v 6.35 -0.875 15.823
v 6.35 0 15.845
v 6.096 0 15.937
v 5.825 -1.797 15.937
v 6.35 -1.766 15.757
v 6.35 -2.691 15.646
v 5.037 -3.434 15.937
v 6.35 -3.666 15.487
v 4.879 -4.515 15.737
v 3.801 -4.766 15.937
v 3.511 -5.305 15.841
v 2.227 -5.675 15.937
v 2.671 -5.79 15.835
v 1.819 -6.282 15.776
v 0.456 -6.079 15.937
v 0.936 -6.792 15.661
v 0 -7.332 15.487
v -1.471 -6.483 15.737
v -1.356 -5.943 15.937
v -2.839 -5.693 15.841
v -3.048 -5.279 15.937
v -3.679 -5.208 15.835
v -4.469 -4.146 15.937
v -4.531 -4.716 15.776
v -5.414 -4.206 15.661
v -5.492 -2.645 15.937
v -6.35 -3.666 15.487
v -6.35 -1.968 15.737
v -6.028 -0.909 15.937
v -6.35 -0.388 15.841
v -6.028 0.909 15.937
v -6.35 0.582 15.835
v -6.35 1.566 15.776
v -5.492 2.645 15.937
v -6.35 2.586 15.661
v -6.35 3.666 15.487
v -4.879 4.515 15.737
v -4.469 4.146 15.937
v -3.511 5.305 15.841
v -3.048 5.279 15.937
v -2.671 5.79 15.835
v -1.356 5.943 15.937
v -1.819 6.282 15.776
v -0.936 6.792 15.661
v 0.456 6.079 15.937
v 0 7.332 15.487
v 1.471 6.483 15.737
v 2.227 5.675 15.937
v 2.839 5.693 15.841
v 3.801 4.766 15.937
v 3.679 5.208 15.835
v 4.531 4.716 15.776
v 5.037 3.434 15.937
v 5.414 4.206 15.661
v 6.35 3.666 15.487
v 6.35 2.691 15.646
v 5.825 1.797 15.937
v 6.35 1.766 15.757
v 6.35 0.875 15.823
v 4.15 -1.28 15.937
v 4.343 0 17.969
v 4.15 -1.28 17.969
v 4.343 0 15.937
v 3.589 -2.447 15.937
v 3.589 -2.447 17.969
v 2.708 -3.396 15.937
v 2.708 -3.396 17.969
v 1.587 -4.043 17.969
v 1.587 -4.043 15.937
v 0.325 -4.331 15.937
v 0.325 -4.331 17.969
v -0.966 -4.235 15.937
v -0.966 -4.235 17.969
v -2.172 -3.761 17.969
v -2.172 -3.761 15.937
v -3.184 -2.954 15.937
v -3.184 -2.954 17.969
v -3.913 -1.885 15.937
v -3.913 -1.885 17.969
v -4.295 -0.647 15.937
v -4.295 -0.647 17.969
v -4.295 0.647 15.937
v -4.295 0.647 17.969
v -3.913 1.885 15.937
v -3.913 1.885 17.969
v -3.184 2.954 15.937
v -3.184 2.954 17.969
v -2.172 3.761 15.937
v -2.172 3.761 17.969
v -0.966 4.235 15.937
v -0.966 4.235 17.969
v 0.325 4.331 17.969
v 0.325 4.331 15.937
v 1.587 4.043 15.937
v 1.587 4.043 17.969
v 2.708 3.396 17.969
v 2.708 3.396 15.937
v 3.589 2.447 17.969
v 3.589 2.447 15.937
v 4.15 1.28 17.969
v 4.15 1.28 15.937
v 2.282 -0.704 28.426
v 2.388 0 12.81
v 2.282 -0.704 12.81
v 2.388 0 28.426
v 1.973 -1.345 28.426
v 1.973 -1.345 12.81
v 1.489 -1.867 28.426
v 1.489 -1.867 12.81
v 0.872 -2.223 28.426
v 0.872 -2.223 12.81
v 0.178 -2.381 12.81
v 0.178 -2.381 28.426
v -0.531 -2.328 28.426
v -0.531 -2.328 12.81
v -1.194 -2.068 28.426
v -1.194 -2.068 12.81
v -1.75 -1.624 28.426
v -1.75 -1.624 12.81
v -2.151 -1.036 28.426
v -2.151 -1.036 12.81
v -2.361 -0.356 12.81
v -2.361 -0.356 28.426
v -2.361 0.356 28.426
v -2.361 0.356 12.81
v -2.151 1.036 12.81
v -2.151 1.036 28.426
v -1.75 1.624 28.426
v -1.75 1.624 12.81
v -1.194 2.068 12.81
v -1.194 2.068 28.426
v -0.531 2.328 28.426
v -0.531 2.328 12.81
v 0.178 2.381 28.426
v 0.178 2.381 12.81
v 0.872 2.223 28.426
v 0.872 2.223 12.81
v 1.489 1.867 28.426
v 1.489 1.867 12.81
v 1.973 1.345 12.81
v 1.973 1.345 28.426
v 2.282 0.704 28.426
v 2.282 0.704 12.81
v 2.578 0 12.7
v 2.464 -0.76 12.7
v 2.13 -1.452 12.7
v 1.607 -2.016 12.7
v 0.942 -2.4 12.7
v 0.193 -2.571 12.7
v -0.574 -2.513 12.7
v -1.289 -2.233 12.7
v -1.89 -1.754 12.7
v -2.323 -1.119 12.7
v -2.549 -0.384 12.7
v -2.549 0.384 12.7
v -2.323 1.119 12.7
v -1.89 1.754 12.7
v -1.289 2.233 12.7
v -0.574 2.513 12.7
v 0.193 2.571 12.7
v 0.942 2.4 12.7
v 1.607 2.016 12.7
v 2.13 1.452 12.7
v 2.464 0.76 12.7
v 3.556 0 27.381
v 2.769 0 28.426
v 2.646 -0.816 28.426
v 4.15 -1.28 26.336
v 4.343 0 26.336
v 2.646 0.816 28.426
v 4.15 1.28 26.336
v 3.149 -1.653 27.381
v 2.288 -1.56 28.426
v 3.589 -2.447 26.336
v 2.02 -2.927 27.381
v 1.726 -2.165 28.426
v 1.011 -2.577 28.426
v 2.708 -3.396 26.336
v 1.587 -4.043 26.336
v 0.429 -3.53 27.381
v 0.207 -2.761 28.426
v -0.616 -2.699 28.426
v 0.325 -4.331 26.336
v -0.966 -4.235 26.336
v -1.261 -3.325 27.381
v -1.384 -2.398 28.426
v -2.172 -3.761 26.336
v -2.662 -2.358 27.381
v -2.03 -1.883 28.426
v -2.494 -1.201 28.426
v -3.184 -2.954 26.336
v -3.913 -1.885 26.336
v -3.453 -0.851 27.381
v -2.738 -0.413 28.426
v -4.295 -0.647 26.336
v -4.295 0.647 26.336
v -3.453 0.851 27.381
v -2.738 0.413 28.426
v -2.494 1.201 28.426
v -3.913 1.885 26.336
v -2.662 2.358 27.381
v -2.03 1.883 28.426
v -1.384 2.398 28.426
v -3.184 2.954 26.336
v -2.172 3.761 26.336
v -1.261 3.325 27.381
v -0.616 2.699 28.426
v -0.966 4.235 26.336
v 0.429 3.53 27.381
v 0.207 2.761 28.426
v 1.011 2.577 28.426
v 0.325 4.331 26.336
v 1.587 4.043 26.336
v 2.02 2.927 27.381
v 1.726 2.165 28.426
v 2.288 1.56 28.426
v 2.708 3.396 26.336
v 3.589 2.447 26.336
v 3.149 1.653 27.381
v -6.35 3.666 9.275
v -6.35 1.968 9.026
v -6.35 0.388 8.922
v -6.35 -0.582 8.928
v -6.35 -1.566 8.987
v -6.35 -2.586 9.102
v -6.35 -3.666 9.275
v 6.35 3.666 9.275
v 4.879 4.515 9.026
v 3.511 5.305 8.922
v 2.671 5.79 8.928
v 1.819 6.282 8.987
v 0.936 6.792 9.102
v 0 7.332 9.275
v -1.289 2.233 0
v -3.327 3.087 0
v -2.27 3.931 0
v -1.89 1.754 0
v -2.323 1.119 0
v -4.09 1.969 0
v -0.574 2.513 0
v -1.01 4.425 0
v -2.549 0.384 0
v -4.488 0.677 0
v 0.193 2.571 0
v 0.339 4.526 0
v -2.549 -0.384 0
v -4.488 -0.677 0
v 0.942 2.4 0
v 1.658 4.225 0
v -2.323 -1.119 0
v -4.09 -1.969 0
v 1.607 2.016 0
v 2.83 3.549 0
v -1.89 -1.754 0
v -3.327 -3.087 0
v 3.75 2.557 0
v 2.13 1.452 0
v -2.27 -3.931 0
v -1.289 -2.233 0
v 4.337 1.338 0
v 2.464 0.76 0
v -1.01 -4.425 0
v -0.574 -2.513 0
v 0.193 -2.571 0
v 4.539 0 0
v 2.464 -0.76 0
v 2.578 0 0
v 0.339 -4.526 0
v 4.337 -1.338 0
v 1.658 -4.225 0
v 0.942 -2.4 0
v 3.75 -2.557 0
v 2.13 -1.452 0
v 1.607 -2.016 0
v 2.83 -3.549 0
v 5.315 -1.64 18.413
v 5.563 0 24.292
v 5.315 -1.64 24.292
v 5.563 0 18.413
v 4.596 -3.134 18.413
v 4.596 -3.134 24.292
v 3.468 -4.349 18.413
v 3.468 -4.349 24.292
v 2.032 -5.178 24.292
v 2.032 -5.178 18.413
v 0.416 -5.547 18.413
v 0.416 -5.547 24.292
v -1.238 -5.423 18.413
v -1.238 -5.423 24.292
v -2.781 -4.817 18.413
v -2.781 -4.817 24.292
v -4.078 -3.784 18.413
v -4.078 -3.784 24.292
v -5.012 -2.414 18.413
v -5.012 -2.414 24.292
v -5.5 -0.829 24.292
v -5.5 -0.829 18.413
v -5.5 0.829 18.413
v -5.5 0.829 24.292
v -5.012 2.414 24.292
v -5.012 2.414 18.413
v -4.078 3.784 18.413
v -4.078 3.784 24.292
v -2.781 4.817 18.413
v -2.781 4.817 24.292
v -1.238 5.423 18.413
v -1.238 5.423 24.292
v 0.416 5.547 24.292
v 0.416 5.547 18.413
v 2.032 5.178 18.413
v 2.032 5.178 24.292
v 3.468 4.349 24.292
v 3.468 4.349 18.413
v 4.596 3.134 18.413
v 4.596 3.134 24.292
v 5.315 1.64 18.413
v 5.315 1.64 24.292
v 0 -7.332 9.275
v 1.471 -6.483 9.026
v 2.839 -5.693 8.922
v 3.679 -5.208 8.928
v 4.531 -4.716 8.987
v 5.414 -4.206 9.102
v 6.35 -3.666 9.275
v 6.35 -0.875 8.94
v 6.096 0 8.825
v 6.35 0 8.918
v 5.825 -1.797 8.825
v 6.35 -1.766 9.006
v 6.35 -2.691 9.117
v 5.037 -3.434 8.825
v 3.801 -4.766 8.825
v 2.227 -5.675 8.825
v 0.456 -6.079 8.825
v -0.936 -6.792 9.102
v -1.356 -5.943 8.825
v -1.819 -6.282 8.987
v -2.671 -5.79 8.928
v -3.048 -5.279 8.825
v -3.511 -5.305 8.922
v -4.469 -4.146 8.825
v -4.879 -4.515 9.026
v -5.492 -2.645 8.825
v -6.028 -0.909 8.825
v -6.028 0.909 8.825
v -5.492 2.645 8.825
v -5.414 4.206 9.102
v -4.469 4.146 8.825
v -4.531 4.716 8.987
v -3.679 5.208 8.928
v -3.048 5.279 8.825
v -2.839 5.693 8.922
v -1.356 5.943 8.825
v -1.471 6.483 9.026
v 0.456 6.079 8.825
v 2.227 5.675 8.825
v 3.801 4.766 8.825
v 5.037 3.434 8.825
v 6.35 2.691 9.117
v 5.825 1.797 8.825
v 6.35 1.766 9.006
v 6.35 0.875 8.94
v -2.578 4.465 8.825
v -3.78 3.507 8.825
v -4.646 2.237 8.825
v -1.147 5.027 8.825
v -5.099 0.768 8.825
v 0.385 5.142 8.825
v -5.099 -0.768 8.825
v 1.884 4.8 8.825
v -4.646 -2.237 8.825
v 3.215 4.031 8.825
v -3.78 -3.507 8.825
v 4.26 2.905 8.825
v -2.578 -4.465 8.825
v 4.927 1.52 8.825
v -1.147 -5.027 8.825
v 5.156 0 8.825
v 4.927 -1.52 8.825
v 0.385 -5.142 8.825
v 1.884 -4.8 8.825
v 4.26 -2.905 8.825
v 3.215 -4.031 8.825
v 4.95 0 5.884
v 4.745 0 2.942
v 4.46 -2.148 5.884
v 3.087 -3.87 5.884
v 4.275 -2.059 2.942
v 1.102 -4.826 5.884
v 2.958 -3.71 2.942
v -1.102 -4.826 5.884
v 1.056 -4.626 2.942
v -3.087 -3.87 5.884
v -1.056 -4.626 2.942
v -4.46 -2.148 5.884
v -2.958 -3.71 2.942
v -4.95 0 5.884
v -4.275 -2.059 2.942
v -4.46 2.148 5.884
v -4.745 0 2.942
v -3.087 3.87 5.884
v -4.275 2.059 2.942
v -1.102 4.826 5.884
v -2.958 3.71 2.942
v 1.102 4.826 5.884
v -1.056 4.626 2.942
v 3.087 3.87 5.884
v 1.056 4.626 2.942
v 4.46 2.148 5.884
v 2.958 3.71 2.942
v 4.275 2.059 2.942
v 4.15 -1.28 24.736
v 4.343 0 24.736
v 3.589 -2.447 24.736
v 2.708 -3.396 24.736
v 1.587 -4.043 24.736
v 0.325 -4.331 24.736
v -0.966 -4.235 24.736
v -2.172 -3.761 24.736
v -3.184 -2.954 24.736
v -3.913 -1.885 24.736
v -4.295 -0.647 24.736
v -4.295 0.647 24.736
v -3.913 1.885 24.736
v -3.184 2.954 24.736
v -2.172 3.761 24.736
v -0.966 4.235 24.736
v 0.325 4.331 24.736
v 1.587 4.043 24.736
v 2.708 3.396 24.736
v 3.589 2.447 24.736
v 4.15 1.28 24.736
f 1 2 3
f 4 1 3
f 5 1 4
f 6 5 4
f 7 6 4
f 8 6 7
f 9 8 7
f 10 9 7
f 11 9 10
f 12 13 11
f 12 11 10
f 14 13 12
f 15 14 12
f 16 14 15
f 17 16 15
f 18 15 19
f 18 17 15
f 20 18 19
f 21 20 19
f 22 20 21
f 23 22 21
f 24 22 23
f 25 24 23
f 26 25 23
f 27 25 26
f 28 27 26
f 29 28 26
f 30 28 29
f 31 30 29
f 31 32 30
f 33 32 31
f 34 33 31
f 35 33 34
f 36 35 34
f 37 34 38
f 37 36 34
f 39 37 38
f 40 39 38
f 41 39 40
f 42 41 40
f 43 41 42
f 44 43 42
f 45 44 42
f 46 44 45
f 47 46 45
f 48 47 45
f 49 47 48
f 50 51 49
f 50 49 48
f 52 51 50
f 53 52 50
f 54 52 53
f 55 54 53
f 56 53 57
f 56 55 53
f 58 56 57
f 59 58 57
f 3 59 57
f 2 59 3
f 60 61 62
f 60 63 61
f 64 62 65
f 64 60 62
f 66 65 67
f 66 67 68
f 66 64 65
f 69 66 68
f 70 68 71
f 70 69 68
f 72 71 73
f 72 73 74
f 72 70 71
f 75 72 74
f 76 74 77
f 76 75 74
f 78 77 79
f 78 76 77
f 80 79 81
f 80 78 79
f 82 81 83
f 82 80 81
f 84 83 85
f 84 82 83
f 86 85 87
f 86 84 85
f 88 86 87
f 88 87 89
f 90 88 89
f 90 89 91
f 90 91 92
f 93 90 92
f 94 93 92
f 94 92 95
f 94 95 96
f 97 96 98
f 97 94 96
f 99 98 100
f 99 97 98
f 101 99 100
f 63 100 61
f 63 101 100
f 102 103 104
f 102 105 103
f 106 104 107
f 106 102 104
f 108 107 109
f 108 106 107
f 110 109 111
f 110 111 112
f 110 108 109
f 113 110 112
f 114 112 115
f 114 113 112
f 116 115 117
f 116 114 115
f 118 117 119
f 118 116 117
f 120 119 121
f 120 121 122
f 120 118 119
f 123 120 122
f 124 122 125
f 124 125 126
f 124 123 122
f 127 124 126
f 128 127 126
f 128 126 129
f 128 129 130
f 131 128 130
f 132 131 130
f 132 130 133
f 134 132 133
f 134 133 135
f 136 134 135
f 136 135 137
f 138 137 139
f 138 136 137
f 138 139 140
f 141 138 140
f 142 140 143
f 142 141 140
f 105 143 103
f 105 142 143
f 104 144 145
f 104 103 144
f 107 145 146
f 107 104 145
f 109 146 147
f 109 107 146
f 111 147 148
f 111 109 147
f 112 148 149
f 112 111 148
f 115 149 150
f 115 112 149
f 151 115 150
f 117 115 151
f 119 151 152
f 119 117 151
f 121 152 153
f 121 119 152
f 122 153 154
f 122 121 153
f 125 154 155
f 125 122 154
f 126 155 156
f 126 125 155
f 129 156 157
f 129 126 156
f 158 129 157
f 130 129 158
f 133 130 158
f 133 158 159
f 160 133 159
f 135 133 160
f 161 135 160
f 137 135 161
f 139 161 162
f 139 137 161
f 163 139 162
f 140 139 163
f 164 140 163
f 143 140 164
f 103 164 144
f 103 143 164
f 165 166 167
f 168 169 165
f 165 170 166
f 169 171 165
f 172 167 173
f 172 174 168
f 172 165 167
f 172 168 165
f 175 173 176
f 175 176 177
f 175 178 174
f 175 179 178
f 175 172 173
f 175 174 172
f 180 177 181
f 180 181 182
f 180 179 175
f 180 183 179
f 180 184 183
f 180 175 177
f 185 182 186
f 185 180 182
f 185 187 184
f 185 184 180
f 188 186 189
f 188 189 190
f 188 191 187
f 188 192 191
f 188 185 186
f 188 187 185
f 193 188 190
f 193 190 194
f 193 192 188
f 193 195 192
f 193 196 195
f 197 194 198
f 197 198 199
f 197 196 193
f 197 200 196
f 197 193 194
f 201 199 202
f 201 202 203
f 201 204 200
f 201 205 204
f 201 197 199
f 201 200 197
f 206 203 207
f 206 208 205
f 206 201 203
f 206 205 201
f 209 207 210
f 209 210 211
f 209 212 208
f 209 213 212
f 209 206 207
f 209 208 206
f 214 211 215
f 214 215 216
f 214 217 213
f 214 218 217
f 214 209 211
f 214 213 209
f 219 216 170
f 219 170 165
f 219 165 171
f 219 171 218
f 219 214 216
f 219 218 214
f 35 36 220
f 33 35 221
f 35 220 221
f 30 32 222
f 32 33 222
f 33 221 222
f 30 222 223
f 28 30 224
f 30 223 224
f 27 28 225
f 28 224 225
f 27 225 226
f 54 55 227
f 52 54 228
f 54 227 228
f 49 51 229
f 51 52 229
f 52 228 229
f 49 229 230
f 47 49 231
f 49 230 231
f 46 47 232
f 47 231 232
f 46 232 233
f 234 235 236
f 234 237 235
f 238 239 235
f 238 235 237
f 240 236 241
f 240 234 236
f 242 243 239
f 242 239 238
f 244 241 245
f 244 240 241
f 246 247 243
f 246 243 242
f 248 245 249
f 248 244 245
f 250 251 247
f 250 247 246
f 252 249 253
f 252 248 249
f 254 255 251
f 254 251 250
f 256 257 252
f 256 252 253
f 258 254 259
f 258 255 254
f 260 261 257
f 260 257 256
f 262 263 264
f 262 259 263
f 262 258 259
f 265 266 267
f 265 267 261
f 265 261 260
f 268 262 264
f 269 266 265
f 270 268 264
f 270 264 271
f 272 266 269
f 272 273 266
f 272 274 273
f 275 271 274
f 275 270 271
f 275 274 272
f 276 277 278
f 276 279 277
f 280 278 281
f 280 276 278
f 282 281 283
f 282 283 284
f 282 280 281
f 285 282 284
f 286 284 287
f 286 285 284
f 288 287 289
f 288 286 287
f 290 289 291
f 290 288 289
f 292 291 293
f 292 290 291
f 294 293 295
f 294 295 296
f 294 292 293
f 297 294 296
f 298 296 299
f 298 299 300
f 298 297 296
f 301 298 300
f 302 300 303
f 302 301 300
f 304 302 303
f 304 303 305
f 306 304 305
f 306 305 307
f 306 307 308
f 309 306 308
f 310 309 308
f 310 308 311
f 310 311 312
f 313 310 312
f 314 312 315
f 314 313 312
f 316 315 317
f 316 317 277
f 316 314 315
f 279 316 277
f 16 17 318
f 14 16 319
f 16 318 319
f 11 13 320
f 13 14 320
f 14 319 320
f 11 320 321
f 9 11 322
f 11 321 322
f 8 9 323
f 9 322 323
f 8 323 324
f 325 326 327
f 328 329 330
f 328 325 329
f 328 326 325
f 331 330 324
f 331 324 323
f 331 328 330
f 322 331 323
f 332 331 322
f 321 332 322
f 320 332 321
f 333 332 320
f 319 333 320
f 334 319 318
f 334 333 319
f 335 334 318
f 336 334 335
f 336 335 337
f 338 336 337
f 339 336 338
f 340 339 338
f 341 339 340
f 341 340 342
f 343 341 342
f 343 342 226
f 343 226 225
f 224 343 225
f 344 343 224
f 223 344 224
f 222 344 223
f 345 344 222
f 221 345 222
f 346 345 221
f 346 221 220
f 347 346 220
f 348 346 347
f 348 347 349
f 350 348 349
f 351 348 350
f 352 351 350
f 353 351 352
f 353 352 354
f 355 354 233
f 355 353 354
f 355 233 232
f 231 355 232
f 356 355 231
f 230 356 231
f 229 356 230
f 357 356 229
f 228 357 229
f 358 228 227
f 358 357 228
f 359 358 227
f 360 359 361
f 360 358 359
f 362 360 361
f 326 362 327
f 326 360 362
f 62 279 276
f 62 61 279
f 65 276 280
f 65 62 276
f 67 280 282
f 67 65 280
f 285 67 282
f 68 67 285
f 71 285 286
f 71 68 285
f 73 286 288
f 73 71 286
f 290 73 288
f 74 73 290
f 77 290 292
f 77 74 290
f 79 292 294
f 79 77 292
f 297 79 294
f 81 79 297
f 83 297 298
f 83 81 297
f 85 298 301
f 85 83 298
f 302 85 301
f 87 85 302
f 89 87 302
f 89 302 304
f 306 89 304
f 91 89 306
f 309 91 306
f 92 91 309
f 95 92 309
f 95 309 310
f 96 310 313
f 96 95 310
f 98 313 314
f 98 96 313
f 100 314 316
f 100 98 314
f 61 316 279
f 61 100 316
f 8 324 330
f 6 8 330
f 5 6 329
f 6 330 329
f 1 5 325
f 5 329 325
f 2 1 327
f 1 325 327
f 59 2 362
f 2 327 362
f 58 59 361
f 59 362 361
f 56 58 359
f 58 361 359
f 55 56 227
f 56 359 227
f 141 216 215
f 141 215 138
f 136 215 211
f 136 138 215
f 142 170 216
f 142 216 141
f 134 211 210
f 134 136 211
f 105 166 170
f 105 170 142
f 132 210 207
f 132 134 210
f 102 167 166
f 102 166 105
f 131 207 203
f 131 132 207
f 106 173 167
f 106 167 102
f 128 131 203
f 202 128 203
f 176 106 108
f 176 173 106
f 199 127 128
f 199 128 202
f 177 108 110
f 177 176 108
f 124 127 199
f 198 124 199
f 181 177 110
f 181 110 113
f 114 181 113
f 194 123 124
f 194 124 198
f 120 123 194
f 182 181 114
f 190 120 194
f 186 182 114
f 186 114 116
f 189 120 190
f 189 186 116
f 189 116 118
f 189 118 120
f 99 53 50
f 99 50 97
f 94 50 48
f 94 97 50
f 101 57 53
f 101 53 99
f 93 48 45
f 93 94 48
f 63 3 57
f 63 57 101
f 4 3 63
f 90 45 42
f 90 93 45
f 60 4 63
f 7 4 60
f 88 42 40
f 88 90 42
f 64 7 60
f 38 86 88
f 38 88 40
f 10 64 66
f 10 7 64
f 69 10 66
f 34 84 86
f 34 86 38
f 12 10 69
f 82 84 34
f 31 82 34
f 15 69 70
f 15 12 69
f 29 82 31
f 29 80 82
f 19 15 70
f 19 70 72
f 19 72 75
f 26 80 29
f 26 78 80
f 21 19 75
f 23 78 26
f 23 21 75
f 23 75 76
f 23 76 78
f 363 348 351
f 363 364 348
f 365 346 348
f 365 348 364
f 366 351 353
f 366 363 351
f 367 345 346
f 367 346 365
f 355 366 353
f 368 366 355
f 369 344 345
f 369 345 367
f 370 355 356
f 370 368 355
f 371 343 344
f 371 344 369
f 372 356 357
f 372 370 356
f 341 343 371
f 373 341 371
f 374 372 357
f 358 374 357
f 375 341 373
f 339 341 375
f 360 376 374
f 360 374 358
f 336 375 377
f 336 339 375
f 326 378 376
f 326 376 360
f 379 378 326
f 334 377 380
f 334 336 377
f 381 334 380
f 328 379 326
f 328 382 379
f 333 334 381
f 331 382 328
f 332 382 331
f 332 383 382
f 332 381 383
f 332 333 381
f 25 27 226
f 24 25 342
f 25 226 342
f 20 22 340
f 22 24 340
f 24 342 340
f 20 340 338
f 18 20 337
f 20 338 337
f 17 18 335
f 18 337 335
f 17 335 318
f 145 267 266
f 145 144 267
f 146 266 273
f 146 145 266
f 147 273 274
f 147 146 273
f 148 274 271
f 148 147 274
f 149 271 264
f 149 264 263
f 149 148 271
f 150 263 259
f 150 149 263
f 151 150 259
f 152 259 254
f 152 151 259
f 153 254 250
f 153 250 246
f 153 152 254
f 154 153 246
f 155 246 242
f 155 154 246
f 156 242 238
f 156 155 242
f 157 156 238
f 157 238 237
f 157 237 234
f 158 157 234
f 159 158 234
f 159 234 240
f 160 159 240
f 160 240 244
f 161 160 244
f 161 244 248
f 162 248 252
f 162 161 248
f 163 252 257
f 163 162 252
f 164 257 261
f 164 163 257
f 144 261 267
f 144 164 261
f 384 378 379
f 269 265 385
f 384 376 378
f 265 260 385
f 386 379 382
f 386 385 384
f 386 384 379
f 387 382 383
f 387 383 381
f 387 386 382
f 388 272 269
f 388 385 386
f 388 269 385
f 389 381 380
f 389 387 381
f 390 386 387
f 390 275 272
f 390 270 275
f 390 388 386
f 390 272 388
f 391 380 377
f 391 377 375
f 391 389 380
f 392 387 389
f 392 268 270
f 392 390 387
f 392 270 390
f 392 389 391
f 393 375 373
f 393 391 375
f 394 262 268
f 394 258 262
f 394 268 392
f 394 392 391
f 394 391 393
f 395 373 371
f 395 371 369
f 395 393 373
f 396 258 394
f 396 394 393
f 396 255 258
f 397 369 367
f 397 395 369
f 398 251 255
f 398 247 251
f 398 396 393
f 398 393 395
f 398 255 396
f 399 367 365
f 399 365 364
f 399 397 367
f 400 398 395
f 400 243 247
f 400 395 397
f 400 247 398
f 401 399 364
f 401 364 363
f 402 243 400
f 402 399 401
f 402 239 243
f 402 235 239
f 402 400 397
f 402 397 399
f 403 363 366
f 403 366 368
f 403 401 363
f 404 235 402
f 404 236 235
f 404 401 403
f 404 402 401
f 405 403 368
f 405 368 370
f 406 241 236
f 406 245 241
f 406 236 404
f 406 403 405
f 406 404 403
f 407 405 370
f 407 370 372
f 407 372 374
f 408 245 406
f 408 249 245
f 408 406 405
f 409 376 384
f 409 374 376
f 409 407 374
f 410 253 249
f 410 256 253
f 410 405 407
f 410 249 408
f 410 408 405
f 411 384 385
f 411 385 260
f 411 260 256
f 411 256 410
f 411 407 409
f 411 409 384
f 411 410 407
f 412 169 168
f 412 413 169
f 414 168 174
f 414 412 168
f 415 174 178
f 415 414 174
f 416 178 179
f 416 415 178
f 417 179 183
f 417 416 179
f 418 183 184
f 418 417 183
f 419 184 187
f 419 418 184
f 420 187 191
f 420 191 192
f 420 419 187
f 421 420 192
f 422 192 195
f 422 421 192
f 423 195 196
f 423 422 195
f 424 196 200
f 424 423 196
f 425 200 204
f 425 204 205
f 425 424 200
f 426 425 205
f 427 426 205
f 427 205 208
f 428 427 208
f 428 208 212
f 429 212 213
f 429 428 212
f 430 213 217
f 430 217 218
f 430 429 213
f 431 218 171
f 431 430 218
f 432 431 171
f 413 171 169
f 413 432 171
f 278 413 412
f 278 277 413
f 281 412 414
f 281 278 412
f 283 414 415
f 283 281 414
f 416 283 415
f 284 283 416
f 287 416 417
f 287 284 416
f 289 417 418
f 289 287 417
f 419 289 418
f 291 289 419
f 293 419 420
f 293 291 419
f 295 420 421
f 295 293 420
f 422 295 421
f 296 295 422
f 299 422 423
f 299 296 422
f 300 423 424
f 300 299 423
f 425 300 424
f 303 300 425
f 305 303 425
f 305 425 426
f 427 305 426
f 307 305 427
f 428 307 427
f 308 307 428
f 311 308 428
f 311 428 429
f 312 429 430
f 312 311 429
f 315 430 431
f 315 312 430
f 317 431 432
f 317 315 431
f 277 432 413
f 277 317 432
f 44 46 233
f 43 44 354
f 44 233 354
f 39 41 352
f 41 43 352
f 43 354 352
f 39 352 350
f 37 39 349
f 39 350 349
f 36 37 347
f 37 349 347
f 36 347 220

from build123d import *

# Parameters (mm, degrees)
SKETCH2_OUTSIDE_W  = 26.768
SKETCH2_OUTSIDE_H  = 26.768
CUT_EXTRUDE1_DEPTH = 31.938714767


with BuildPart() as part:
    # Sketch1 → Revolve1 (revolve)
    with BuildSketch(Plane(origin=(0, 0, 0), x_dir=(0, 0, -1), z_dir=(1, 0, 0)), mode=Mode.PRIVATE) as revolve1_sk:
        Polygon((-12.809985226, 2.3876), (-28.426098562, 2.3876), (-28.426098562, 2.7686), (-26.336268377, 4.3434), (-24.736068377, 4.3434), (-24.292315867, 5.5626), (-18.413231404, 5.5626), (-17.969478894, 4.3434), (-15.937478894, 4.3434), (-15.937478894, 6.096), (-15.012994499, 8.636), (-9.749963289, 8.636), (-8.825478894, 6.096), (-8.825478894, 5.1562), (0, 4.539062397), (0, 2.5781), (-12.7, 2.5781), align=None)
    revolve(revolve1_sk.sketch.rotate(Axis((0, 0, -2.001994087), (0, 0, -1)), 90), axis=Axis((0, 0, -2.001994087), (0, 0, -1)))

    # Sketch2 outside → Cut-Extrude1 (cut, through all)
    with BuildSketch(Plane.XY):
        Rectangle(SKETCH2_OUTSIDE_W, SKETCH2_OUTSIDE_H)
        Polygon((0, 7.332348419), (-6.35, 3.666174209), (-6.35, -3.666174209), (0, -7.332348419), (6.35, -3.666174209), (6.35, 3.666174209), align=None, mode=Mode.SUBTRACT)
    extrude(amount=CUT_EXTRUDE1_DEPTH, mode=Mode.SUBTRACT)


solid = part.part
